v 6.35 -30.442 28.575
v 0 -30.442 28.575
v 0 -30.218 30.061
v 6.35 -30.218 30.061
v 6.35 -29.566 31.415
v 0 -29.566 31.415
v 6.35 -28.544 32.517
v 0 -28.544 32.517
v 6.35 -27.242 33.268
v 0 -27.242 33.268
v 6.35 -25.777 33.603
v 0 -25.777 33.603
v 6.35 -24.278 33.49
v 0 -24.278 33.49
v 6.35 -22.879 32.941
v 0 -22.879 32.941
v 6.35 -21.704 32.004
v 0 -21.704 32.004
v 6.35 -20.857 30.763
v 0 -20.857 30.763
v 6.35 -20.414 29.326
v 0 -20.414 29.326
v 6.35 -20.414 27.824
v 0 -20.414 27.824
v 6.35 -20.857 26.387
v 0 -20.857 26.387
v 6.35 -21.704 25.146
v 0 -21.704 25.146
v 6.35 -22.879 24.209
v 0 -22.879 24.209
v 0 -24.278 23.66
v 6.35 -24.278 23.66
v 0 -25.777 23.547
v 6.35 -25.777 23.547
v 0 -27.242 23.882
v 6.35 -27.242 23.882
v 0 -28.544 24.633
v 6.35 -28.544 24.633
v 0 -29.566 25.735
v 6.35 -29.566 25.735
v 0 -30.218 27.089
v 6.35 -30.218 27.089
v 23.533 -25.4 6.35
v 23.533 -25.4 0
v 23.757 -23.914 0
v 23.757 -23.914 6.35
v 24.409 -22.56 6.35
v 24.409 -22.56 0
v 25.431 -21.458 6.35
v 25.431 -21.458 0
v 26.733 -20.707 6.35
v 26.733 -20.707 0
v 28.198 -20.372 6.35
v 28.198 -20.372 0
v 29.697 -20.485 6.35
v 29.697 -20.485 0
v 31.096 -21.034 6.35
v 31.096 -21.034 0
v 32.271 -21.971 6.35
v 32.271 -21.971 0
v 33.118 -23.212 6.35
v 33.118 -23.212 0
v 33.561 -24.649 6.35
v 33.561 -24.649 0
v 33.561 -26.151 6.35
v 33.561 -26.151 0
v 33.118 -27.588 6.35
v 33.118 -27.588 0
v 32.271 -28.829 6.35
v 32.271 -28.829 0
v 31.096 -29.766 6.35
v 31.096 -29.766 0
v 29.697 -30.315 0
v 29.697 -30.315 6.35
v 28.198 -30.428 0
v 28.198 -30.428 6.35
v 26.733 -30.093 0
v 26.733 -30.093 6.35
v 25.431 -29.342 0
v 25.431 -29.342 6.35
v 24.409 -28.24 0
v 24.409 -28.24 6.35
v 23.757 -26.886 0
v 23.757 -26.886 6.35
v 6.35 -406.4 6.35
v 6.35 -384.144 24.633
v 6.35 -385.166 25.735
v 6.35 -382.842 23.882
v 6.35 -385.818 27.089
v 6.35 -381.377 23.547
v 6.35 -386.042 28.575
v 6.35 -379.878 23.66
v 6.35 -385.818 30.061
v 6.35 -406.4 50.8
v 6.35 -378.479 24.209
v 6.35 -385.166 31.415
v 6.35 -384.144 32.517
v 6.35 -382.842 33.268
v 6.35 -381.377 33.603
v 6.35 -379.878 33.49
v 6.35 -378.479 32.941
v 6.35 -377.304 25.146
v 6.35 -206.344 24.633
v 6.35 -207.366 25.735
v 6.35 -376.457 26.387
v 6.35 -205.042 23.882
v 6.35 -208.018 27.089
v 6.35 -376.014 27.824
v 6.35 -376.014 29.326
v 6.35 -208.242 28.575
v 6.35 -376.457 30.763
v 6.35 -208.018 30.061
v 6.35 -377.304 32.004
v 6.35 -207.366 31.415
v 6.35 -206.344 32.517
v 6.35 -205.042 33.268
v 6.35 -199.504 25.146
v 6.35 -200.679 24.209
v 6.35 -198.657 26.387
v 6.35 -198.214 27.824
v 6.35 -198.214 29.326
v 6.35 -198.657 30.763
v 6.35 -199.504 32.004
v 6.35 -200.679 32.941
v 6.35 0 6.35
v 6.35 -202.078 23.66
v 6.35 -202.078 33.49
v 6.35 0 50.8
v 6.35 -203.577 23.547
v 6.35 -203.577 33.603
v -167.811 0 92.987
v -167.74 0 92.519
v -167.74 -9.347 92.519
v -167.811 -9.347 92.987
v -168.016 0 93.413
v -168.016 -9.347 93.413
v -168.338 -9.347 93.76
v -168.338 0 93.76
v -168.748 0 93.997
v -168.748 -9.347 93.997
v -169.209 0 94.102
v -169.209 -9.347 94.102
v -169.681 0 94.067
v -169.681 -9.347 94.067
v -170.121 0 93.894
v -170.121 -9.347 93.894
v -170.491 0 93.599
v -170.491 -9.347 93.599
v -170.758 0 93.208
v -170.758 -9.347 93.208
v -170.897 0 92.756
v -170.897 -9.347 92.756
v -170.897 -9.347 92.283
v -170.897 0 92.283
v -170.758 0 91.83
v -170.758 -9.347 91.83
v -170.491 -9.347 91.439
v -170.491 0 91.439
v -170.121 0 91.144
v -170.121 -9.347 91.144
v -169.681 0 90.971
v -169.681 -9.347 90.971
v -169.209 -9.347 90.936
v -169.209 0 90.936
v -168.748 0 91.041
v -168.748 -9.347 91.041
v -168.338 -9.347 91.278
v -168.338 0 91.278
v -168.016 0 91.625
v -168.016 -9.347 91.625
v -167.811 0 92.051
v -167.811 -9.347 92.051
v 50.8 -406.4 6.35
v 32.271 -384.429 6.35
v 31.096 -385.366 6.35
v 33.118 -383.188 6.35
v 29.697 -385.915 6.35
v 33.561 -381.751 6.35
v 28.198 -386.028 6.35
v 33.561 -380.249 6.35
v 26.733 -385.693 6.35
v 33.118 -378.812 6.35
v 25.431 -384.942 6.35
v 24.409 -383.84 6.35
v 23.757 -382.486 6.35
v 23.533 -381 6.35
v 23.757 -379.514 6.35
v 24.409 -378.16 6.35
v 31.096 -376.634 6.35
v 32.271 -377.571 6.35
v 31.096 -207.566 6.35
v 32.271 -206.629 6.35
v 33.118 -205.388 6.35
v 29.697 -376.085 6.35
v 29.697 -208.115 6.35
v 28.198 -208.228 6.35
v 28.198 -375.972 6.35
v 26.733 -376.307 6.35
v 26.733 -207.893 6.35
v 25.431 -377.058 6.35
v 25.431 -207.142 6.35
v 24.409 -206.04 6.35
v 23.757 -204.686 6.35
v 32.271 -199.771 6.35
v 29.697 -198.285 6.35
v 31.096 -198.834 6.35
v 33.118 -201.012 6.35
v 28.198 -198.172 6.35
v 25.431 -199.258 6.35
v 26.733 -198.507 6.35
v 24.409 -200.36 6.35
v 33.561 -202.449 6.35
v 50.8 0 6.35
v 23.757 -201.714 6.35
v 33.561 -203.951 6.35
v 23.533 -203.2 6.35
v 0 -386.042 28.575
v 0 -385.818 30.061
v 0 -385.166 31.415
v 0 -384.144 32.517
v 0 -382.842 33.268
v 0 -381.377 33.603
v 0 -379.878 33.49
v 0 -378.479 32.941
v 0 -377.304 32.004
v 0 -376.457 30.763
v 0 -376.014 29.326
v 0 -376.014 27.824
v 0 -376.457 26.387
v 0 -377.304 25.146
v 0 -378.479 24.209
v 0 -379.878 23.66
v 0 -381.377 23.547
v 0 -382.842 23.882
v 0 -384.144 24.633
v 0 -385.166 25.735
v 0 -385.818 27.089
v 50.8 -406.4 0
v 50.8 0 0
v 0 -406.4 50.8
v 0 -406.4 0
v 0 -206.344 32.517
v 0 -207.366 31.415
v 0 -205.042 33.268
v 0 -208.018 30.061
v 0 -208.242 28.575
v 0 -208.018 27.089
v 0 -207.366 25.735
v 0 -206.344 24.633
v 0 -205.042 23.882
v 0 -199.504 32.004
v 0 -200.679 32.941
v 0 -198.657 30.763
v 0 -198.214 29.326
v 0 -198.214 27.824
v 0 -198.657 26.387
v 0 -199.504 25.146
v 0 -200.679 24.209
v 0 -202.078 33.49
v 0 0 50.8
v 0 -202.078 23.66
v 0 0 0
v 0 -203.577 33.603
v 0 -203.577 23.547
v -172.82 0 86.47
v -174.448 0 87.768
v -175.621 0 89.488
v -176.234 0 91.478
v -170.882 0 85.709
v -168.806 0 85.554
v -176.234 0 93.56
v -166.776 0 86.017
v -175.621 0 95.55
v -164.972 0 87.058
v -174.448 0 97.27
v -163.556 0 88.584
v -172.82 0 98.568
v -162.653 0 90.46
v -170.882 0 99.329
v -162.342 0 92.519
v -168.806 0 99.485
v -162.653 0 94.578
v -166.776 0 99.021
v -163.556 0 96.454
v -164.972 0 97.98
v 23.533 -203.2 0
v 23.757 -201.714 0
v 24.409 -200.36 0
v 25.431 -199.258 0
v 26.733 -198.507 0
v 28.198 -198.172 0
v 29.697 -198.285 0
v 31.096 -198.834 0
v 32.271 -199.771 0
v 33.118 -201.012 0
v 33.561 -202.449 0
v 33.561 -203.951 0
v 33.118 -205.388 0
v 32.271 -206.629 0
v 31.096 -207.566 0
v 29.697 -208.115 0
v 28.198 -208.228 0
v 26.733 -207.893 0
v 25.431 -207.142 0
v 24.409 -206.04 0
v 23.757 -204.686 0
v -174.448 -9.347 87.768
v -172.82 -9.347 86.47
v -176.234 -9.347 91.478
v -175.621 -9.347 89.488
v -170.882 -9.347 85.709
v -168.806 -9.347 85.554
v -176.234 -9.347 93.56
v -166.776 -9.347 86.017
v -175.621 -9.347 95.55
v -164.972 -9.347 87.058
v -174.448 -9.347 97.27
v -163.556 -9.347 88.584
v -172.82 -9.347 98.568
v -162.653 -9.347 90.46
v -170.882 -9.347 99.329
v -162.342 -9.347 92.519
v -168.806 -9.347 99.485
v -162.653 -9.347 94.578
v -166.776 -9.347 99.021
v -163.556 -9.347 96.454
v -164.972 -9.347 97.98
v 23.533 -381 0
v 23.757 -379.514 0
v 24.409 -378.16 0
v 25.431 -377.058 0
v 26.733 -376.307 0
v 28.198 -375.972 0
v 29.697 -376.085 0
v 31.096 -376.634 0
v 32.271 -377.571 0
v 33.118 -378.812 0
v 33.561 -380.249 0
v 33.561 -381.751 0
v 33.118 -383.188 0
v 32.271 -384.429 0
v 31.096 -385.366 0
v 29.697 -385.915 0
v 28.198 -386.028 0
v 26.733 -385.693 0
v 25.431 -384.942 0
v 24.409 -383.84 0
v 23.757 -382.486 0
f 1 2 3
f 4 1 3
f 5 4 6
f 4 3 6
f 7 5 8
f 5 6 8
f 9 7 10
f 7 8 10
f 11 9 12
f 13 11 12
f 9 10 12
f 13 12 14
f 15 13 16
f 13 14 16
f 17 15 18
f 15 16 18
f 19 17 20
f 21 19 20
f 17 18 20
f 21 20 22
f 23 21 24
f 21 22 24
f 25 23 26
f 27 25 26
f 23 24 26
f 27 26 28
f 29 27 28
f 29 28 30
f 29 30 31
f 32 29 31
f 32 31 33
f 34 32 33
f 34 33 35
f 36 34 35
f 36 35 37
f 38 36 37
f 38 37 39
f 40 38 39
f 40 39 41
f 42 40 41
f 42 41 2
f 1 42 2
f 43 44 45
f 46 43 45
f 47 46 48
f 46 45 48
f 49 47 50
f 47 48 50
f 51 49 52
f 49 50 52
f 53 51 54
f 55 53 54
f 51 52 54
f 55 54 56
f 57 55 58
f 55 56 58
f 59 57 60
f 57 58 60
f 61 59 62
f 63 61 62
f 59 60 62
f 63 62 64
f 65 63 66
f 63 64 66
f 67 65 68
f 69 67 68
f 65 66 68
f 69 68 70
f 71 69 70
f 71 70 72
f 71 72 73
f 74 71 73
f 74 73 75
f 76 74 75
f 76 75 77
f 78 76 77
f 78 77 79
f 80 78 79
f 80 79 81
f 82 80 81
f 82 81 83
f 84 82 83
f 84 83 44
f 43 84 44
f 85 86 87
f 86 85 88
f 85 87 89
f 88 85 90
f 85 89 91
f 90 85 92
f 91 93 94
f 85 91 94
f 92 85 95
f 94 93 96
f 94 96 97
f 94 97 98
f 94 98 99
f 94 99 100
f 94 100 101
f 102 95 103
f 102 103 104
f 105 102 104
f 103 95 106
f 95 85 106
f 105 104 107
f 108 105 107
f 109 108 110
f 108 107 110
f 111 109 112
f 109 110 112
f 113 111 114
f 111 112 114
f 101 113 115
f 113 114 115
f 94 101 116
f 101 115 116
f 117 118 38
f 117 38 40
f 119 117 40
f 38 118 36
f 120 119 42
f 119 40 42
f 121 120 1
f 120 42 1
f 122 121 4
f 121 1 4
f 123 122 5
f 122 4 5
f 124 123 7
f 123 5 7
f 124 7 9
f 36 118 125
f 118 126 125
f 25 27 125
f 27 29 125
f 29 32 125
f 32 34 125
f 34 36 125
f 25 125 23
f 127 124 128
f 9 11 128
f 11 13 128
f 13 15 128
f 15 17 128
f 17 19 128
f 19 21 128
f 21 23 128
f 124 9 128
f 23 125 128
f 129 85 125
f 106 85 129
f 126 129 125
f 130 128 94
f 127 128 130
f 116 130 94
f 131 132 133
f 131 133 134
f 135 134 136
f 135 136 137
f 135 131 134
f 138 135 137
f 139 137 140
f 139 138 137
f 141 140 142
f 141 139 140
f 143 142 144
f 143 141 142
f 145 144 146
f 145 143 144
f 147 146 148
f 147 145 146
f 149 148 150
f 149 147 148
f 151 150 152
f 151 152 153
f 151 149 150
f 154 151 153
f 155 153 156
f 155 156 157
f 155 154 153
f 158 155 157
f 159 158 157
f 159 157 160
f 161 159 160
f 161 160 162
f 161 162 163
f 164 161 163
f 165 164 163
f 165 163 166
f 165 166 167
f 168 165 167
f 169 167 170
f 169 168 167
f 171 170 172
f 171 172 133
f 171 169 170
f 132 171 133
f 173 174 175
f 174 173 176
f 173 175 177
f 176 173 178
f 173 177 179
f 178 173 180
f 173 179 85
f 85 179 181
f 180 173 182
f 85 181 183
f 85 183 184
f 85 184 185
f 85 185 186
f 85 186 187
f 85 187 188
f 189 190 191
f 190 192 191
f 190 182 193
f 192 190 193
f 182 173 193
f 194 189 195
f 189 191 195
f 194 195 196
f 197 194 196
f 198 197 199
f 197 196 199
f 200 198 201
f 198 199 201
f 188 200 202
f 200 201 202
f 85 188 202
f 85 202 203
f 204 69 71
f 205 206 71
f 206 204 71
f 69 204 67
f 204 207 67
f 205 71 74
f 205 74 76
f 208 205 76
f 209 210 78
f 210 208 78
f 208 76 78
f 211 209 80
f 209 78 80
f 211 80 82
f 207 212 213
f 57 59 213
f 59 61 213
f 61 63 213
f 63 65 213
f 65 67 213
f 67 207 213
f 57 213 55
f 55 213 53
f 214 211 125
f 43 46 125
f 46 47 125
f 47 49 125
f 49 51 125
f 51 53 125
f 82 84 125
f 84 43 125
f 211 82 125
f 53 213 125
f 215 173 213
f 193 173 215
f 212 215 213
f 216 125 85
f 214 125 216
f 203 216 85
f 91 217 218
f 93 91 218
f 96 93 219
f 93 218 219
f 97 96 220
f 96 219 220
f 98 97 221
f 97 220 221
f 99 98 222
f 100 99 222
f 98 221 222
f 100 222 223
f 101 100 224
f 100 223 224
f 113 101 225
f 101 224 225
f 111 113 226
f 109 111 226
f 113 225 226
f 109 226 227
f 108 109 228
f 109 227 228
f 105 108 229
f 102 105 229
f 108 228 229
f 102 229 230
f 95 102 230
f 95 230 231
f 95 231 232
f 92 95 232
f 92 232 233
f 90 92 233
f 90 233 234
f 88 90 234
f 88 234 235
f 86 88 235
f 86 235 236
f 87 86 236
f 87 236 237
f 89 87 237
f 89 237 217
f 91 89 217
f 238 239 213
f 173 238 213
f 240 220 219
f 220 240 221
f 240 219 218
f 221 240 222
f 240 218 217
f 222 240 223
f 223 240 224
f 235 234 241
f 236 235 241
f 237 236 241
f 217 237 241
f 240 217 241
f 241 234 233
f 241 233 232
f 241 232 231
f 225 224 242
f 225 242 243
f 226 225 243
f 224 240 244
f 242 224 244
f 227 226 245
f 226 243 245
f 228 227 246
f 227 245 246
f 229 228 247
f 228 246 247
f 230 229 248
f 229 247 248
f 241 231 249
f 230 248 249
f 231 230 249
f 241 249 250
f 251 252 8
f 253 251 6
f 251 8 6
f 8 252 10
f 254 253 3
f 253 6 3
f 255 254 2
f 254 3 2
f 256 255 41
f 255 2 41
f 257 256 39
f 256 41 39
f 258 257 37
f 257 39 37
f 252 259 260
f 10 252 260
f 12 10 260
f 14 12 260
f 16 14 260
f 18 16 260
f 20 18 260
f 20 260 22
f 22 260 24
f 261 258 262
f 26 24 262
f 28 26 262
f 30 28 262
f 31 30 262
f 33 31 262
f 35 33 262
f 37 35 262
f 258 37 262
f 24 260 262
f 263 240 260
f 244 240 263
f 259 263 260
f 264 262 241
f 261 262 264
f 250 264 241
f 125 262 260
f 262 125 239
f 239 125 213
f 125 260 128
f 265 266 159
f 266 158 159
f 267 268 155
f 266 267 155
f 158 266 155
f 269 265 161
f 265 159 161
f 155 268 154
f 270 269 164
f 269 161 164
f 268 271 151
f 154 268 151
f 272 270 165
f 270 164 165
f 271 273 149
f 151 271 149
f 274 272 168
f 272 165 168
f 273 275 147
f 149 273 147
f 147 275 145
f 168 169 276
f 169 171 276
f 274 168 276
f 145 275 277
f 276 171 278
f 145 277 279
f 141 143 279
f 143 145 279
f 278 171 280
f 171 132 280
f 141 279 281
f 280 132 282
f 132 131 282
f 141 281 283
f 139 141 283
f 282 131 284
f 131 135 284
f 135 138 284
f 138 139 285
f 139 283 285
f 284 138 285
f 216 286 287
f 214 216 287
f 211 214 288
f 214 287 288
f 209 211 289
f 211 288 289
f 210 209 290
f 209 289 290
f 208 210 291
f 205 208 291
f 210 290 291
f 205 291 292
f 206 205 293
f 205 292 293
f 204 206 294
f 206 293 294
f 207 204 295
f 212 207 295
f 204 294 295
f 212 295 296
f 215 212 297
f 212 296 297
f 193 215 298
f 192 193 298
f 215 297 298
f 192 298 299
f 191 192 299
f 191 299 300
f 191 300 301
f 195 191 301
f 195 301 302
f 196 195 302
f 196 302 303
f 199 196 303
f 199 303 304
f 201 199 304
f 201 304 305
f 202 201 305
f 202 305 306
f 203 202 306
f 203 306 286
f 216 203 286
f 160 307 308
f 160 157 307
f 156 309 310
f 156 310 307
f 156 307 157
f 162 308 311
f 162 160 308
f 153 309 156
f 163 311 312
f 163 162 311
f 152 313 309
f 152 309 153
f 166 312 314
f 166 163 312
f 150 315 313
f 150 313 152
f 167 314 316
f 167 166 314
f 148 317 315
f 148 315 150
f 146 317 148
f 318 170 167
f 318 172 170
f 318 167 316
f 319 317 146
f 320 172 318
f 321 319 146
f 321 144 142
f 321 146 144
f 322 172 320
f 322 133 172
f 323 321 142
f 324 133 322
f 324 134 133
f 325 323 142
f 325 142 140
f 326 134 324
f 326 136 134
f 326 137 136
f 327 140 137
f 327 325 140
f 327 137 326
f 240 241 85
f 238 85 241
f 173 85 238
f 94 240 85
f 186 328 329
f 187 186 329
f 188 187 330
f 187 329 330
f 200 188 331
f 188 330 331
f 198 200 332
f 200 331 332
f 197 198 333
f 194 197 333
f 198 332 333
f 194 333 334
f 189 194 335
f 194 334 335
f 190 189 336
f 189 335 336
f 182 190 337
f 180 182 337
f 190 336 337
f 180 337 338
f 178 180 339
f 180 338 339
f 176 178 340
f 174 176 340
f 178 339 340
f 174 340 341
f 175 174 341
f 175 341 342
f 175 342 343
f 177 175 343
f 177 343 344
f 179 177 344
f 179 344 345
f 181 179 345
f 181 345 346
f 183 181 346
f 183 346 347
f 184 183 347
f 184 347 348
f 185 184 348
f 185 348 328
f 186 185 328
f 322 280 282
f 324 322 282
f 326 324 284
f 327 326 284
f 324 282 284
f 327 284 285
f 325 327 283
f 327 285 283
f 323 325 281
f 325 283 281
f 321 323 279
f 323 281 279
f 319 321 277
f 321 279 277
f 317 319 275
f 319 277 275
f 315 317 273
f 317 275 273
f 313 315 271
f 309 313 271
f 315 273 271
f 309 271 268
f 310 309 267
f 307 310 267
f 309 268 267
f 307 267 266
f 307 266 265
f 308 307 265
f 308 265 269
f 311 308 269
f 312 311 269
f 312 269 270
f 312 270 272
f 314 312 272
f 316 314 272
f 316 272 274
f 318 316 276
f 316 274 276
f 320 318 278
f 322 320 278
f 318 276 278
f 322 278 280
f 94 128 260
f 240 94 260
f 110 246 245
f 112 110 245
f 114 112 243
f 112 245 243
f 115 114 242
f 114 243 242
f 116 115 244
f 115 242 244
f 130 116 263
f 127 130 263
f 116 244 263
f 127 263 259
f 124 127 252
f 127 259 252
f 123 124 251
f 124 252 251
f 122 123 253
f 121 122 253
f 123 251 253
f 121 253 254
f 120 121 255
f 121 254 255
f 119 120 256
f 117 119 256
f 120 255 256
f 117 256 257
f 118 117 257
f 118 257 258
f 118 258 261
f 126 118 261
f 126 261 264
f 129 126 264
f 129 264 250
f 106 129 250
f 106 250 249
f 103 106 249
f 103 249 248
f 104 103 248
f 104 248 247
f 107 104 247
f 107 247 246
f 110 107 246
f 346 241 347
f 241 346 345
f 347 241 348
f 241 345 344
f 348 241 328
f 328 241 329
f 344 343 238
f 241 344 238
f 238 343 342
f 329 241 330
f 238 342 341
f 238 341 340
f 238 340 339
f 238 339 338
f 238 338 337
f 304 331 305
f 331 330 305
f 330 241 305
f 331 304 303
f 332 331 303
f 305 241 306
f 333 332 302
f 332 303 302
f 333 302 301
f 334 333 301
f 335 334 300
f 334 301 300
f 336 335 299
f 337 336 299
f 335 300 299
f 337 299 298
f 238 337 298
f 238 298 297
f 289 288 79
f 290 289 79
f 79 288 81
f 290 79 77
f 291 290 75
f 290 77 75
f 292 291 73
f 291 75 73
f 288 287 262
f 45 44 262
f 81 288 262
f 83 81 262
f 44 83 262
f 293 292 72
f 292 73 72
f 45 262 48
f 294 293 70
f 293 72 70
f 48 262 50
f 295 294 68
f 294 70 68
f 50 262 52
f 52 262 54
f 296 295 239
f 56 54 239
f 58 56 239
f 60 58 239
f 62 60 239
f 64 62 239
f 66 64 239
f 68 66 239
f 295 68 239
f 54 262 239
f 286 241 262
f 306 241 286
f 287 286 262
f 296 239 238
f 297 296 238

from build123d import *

# Parameters (mm, degrees)
F1_DEPTH       = 406.4
F4_D           = 10.0838
F4_DEPTH       = 20.6502
F4_TIP         = 3.0294791551
F4_ON_F2_D     = 10.0838
F4_ON_F2_DEPTH = 20.6502
F4_ON_F2_TIP   = 3.0294791551
F5_R           = 6.985
F5_R_2         = 1.5875
F6_DEPTH       = 9.3472


with BuildPart() as f1:
    # F0 (on Front) → F1 (new body)
    with BuildSketch(Plane.XZ):
        Polygon((0, 50.8), (0, 0), (50.8, 0), (50.8, 6.35), (6.35, 6.35), (6.35, 50.8), align=None)
    extrude(amount=F1_DEPTH)

    # F4
    with Locations(Plane.XY.offset(6.35)):
        with Locations((28.575, -381), (28.575, -203.2), (28.575, -25.4)):
            Hole(F4_D / 2, depth=F4_DEPTH)
            with Locations((0, 0, -(F4_DEPTH + F4_TIP / 2))):  # 118° drill point
                Cone(0, F4_D / 2, F4_TIP, mode=Mode.SUBTRACT)

    # F4 on F2
    with Locations(Plane.YZ.offset(6.35)):
        with Locations((-203.2, 28.575), (-25.4, 28.575), (-381, 28.575)):
            Hole(F4_ON_F2_D / 2, depth=F4_ON_F2_DEPTH)
            with Locations((0, 0, -(F4_ON_F2_DEPTH + F4_ON_F2_TIP / 2))):  # 118° drill point
                Cone(0, F4_ON_F2_D / 2, F4_ON_F2_TIP, mode=Mode.SUBTRACT)


with BuildPart() as f6:
    # F5 (on Front) → F6 (new body)
    with BuildSketch(Plane.XZ):
        with Locations((-169.3274974823, 92.5191566348)):
            Circle(F5_R)
        with Locations((-169.3274974823, 92.5191566348)):
            Circle(F5_R_2, mode=Mode.SUBTRACT)
    extrude(amount=F6_DEPTH)


solid = Compound([f1.part, f6.part])
